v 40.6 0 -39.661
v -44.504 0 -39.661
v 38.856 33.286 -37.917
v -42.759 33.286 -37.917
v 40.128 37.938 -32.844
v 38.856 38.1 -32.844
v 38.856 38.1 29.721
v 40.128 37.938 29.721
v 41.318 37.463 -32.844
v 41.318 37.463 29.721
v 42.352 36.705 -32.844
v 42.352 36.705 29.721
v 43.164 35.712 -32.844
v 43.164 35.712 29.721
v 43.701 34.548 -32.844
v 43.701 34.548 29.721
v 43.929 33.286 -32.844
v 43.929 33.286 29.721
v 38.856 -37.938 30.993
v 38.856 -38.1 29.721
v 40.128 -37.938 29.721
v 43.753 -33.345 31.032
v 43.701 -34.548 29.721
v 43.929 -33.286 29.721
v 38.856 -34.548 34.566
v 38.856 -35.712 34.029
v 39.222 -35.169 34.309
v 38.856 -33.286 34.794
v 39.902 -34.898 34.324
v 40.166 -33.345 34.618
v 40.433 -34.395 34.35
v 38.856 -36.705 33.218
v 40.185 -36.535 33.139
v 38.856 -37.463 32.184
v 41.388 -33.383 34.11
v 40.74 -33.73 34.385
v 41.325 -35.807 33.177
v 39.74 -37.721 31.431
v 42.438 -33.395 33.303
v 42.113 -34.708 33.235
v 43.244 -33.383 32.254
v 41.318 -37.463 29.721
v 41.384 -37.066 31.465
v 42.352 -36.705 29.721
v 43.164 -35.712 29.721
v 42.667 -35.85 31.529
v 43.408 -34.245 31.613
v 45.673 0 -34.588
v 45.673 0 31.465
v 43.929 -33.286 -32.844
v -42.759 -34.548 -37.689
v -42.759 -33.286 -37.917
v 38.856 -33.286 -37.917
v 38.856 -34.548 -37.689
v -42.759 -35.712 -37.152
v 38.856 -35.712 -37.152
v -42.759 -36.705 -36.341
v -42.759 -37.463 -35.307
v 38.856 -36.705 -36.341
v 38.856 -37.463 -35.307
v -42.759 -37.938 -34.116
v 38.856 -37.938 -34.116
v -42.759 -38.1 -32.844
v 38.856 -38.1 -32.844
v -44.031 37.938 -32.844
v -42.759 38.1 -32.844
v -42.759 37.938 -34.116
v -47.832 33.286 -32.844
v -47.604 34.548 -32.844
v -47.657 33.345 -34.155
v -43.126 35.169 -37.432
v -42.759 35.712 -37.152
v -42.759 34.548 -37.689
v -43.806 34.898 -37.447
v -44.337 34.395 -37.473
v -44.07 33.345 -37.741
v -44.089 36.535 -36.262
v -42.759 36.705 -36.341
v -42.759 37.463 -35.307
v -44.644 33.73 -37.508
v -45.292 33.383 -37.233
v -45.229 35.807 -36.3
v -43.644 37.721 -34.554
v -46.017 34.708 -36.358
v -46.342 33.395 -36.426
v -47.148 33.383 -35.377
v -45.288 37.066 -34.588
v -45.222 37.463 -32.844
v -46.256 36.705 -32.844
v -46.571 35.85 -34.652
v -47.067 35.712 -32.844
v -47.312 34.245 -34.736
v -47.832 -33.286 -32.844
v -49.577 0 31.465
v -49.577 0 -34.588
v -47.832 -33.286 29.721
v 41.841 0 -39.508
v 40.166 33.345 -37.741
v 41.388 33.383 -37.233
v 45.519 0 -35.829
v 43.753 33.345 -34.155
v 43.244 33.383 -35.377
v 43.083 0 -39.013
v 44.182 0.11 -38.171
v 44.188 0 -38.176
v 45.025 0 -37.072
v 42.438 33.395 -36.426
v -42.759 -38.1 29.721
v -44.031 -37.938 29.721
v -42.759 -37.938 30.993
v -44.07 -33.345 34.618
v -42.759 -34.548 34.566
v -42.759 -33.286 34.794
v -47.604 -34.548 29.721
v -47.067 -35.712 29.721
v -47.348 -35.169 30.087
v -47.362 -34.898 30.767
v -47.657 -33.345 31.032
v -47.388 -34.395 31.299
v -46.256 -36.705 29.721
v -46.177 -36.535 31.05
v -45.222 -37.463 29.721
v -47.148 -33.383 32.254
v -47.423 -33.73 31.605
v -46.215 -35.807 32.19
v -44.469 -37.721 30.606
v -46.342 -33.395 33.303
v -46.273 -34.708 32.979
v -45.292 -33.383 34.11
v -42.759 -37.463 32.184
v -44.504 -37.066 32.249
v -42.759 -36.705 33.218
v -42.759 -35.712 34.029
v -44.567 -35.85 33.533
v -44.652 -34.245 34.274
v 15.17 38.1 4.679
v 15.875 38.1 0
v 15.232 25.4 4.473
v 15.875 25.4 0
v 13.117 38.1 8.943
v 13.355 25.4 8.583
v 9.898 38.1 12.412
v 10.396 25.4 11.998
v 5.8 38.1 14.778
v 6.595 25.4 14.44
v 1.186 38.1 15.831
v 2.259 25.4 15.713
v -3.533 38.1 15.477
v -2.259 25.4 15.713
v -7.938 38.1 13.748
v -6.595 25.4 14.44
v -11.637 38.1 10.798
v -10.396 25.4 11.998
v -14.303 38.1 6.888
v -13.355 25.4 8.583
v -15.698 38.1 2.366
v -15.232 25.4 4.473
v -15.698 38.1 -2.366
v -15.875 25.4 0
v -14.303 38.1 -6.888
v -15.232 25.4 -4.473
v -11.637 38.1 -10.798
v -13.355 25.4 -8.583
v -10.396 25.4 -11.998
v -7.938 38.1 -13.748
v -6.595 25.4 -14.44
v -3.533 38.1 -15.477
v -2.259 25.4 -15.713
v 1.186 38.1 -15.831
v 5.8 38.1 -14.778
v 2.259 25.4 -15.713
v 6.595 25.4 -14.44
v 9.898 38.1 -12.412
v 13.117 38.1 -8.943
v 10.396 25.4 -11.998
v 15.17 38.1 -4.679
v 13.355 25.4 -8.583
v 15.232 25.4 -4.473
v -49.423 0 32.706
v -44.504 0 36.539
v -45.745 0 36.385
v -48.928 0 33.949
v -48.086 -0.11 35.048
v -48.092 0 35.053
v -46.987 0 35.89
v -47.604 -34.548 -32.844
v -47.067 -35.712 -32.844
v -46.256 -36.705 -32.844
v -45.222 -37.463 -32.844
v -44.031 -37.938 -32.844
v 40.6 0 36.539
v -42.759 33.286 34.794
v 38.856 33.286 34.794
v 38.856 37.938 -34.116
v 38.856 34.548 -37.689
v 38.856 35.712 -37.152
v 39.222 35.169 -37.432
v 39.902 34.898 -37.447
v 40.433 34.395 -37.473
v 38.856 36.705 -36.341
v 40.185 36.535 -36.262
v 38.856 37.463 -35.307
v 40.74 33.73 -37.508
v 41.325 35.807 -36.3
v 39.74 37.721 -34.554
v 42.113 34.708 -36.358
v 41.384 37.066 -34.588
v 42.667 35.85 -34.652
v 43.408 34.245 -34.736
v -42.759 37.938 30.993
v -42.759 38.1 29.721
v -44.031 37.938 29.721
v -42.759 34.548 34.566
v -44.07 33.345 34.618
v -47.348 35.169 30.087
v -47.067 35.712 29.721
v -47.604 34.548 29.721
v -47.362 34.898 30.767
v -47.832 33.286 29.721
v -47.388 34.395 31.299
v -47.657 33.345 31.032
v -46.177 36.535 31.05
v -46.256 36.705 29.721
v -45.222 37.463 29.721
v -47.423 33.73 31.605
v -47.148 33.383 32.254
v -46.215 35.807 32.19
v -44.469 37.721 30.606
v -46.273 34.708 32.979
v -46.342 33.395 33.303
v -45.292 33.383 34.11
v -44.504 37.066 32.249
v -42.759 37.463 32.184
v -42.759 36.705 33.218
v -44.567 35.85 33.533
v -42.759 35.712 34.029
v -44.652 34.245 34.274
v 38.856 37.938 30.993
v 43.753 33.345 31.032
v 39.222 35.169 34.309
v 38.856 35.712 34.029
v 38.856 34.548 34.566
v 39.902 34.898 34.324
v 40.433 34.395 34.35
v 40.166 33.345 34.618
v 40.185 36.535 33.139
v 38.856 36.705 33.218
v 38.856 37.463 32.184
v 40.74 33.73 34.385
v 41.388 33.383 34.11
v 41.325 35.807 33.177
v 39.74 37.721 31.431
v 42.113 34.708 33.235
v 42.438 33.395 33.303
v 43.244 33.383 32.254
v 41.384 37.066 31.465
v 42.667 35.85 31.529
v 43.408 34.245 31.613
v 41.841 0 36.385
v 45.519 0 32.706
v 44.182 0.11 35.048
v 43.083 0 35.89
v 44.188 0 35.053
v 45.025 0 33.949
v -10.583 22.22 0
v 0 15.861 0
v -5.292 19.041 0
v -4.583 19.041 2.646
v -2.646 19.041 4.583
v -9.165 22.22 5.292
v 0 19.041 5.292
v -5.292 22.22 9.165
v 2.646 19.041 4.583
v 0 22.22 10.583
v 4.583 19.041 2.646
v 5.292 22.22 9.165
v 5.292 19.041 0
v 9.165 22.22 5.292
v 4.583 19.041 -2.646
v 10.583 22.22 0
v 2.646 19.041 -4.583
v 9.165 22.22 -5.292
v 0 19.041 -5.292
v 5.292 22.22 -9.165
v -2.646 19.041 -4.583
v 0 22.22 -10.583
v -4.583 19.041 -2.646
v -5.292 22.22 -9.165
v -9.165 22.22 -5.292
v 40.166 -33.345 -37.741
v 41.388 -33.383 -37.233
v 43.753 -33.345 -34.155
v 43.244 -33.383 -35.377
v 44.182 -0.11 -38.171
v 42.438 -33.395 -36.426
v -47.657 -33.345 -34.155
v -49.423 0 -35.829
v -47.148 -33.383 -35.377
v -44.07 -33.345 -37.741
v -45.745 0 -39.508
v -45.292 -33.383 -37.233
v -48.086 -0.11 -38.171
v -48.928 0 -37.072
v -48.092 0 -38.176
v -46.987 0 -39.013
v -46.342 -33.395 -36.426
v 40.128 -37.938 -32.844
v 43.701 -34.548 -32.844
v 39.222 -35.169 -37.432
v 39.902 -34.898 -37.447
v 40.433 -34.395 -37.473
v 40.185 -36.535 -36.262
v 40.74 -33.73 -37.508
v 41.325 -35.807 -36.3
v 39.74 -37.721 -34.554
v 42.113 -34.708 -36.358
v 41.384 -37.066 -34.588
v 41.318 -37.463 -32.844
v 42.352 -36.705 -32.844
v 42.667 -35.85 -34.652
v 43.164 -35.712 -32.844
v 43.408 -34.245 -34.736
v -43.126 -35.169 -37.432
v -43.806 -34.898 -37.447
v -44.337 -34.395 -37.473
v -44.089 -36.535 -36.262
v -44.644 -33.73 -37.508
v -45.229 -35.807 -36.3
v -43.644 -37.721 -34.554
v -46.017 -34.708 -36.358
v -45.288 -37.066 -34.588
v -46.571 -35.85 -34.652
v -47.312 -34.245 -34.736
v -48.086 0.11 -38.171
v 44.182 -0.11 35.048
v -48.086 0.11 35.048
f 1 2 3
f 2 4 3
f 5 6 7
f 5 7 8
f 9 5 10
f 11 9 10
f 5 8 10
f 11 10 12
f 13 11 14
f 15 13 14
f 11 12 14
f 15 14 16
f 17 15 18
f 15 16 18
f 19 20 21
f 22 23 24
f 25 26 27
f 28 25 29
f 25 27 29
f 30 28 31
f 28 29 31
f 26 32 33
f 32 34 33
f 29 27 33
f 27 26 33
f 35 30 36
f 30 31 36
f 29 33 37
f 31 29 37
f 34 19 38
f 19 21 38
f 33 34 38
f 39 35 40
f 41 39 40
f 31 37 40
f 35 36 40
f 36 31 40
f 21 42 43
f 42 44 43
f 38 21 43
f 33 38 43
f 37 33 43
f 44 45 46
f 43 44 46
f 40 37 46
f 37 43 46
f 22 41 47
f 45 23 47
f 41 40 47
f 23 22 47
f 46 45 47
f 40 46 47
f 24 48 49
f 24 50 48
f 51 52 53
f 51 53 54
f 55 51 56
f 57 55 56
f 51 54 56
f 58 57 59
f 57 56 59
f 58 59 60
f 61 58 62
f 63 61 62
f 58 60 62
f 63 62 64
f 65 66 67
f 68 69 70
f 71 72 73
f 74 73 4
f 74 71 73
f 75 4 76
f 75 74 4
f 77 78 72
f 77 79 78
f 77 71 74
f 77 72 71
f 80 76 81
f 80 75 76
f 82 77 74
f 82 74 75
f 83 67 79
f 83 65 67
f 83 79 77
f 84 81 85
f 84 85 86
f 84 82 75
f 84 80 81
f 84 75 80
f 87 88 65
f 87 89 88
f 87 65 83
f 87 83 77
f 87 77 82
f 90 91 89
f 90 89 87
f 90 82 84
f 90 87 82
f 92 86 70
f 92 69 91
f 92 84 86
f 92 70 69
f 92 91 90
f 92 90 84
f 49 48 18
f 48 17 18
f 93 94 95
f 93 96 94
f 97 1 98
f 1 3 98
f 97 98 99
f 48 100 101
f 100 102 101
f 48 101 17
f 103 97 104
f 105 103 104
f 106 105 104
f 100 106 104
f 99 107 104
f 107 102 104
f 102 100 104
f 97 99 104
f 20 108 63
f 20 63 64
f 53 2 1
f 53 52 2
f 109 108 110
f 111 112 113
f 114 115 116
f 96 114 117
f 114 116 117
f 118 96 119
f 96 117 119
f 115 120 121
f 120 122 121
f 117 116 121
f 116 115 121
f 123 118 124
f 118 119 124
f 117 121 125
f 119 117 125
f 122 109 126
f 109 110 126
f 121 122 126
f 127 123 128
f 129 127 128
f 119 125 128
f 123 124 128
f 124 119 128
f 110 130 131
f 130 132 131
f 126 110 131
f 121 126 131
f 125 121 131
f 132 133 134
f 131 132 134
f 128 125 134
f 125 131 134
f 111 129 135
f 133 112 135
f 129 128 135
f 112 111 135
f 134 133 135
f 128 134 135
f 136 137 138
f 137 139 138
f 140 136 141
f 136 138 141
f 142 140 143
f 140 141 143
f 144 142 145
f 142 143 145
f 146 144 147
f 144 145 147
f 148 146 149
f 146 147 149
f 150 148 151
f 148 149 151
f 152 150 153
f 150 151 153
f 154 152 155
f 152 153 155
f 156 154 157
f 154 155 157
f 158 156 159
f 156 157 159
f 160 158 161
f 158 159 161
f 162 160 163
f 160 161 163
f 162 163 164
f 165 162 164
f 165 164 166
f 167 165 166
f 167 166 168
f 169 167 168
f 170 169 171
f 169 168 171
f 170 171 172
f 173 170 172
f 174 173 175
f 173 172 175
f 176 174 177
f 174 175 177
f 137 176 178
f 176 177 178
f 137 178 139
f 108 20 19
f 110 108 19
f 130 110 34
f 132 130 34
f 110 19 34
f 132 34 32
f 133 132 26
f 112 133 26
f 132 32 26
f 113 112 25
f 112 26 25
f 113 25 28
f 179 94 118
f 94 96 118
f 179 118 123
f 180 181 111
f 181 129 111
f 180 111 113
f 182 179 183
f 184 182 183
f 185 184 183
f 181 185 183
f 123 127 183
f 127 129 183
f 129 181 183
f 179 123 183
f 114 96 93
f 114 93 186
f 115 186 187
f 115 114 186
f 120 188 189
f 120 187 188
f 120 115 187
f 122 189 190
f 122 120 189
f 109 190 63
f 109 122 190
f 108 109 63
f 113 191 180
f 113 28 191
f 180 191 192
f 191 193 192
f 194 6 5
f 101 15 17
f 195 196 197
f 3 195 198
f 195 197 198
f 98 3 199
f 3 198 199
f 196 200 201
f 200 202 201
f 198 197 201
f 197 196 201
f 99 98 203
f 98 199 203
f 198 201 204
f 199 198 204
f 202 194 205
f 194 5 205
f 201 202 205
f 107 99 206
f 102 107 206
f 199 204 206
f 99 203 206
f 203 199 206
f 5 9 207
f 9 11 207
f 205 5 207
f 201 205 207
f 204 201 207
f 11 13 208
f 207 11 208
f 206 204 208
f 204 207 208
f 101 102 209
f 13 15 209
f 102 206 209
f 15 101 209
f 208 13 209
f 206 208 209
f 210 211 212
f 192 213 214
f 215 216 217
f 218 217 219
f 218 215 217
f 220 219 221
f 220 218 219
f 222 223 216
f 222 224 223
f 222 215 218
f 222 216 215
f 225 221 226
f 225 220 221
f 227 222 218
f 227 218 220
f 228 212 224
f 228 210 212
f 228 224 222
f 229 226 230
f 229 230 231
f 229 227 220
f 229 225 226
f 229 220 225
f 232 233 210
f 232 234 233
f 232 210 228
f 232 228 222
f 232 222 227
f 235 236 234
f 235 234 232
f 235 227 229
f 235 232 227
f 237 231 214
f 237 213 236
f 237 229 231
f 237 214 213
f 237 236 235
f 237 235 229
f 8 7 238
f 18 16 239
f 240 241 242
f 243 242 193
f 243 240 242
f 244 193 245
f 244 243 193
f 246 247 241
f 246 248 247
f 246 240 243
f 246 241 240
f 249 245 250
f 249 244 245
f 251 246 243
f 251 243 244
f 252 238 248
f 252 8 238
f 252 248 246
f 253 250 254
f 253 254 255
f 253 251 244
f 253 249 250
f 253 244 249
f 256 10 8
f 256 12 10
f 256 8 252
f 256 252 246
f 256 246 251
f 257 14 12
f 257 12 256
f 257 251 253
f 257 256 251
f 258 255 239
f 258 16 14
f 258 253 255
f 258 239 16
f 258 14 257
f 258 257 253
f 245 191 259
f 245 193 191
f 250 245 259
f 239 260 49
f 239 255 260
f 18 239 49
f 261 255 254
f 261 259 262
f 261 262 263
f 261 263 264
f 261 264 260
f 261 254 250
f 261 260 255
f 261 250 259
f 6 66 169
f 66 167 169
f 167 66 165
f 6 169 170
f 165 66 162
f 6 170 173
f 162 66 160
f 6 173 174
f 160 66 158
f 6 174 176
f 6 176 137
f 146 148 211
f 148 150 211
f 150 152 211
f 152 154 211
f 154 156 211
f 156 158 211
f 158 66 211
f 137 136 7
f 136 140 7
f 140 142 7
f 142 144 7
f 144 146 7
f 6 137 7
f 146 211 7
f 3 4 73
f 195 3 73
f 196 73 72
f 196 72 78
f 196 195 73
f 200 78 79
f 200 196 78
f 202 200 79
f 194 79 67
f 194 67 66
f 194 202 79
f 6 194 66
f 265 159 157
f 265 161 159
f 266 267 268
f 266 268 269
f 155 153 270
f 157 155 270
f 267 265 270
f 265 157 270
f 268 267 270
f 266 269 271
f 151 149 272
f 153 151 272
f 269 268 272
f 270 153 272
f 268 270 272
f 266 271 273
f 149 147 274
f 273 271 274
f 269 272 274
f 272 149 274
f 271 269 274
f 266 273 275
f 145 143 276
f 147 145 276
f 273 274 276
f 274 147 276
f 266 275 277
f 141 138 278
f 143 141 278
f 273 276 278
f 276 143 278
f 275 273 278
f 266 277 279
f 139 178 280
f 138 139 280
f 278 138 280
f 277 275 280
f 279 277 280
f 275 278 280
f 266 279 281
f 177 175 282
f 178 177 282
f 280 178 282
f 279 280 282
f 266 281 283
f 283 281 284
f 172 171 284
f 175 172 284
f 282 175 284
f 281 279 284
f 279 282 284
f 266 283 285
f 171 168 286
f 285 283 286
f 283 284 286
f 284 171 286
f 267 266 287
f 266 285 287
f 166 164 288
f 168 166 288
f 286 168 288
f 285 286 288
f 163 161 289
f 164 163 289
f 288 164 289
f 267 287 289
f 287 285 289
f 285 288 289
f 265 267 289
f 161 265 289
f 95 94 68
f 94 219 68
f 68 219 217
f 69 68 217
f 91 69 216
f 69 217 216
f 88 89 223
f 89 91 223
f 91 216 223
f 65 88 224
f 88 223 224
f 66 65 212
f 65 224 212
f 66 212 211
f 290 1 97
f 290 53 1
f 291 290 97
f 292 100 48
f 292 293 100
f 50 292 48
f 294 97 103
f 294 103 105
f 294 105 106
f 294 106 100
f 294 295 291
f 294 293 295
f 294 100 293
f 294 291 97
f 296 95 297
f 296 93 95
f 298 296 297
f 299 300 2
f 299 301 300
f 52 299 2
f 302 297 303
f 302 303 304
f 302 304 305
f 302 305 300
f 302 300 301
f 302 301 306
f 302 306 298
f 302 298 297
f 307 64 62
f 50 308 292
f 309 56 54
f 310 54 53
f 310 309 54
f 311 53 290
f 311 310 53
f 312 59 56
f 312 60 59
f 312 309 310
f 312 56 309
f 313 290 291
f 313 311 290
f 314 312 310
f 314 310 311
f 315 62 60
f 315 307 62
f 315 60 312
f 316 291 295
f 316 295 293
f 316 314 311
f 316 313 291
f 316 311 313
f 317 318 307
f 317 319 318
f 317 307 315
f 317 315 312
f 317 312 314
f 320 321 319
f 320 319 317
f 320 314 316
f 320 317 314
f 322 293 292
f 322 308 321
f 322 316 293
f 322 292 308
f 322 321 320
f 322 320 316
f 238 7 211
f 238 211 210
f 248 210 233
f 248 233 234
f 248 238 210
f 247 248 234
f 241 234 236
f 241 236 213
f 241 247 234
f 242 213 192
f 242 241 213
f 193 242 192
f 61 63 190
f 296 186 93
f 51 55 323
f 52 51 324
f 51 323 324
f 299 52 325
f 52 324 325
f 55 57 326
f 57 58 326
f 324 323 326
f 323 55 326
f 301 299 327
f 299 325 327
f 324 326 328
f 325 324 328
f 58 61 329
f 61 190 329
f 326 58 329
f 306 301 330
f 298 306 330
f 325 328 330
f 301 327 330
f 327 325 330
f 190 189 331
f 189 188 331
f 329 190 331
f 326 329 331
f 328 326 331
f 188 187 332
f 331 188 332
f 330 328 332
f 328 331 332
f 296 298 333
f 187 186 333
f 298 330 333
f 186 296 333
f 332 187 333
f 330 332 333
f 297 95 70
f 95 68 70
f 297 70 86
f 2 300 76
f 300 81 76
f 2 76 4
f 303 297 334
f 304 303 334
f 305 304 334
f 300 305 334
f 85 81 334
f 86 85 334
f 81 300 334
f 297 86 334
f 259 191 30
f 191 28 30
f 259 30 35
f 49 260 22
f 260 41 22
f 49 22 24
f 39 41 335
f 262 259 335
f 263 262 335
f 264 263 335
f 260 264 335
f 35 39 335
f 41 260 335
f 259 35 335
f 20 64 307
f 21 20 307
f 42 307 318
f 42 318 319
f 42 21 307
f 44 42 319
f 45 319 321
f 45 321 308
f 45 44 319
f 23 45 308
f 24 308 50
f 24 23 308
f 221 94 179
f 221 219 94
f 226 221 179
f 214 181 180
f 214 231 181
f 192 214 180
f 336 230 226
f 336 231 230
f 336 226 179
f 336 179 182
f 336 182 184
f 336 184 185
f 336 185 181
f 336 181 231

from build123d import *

# Parameters (mm, degrees)
F0_W     = 95.25
F0_H     = 76.2
F1_DEPTH = 38.1
F1_TAPER = 3
F2_R     = 5.08
F4_D     = 31.75
F4_DEPTH = 12.7
F4_TIP   = 9.5386623271


with BuildPart() as f1:
    # F0 (on Front) → F1 (new body, symmetric)
    with BuildSketch(Plane.XZ):
        with Locations((-1.951872288, -1.5614978304)):
            Rectangle(F0_W, F0_H)
    extrude(amount=F1_DEPTH, both=True, taper=F1_TAPER)

    # F2
    f2_edges = [f1.edges().sort_by_distance(p)[0] for p in [
        (43.676391, -38.1, -1.561498),
        (-1.951872, -38.1, 34.541766),
        (-47.580136, -38.1, -1.561498),
        (-1.951872, -38.1, -37.664761),
        (43.676391, 38.1, -1.561498),
        (-1.951872, 38.1, 34.541766),
        (-47.580136, 38.1, -1.561498),
        (-1.951872, 38.1, -37.664761),
        (44.67476, -19.05, 35.540134),
        (44.67476, -19.05, -38.66313),
        (44.67476, 19.05, 35.540134),
        (44.67476, 19.05, -38.66313),
        (-48.578504, -19.05, 35.540134),
        (-48.578504, -19.05, -38.66313),
        (-48.578504, 19.05, 35.540134),
        (-48.578504, 19.05, -38.66313),
    ]]
    fillet(f2_edges, radius=F2_R)

    # F4
    with Locations(Plane(origin=(0, 38.1, 0), x_dir=(-1, 0, 0), z_dir=(0, 1, 0))):
        with Locations((0, 0)):
            Hole(F4_D / 2, depth=F4_DEPTH)
            with Locations((0, 0, -(F4_DEPTH + F4_TIP / 2))):  # 118° drill point
                Cone(0, F4_D / 2, F4_TIP, mode=Mode.SUBTRACT)


solid = f1.part
